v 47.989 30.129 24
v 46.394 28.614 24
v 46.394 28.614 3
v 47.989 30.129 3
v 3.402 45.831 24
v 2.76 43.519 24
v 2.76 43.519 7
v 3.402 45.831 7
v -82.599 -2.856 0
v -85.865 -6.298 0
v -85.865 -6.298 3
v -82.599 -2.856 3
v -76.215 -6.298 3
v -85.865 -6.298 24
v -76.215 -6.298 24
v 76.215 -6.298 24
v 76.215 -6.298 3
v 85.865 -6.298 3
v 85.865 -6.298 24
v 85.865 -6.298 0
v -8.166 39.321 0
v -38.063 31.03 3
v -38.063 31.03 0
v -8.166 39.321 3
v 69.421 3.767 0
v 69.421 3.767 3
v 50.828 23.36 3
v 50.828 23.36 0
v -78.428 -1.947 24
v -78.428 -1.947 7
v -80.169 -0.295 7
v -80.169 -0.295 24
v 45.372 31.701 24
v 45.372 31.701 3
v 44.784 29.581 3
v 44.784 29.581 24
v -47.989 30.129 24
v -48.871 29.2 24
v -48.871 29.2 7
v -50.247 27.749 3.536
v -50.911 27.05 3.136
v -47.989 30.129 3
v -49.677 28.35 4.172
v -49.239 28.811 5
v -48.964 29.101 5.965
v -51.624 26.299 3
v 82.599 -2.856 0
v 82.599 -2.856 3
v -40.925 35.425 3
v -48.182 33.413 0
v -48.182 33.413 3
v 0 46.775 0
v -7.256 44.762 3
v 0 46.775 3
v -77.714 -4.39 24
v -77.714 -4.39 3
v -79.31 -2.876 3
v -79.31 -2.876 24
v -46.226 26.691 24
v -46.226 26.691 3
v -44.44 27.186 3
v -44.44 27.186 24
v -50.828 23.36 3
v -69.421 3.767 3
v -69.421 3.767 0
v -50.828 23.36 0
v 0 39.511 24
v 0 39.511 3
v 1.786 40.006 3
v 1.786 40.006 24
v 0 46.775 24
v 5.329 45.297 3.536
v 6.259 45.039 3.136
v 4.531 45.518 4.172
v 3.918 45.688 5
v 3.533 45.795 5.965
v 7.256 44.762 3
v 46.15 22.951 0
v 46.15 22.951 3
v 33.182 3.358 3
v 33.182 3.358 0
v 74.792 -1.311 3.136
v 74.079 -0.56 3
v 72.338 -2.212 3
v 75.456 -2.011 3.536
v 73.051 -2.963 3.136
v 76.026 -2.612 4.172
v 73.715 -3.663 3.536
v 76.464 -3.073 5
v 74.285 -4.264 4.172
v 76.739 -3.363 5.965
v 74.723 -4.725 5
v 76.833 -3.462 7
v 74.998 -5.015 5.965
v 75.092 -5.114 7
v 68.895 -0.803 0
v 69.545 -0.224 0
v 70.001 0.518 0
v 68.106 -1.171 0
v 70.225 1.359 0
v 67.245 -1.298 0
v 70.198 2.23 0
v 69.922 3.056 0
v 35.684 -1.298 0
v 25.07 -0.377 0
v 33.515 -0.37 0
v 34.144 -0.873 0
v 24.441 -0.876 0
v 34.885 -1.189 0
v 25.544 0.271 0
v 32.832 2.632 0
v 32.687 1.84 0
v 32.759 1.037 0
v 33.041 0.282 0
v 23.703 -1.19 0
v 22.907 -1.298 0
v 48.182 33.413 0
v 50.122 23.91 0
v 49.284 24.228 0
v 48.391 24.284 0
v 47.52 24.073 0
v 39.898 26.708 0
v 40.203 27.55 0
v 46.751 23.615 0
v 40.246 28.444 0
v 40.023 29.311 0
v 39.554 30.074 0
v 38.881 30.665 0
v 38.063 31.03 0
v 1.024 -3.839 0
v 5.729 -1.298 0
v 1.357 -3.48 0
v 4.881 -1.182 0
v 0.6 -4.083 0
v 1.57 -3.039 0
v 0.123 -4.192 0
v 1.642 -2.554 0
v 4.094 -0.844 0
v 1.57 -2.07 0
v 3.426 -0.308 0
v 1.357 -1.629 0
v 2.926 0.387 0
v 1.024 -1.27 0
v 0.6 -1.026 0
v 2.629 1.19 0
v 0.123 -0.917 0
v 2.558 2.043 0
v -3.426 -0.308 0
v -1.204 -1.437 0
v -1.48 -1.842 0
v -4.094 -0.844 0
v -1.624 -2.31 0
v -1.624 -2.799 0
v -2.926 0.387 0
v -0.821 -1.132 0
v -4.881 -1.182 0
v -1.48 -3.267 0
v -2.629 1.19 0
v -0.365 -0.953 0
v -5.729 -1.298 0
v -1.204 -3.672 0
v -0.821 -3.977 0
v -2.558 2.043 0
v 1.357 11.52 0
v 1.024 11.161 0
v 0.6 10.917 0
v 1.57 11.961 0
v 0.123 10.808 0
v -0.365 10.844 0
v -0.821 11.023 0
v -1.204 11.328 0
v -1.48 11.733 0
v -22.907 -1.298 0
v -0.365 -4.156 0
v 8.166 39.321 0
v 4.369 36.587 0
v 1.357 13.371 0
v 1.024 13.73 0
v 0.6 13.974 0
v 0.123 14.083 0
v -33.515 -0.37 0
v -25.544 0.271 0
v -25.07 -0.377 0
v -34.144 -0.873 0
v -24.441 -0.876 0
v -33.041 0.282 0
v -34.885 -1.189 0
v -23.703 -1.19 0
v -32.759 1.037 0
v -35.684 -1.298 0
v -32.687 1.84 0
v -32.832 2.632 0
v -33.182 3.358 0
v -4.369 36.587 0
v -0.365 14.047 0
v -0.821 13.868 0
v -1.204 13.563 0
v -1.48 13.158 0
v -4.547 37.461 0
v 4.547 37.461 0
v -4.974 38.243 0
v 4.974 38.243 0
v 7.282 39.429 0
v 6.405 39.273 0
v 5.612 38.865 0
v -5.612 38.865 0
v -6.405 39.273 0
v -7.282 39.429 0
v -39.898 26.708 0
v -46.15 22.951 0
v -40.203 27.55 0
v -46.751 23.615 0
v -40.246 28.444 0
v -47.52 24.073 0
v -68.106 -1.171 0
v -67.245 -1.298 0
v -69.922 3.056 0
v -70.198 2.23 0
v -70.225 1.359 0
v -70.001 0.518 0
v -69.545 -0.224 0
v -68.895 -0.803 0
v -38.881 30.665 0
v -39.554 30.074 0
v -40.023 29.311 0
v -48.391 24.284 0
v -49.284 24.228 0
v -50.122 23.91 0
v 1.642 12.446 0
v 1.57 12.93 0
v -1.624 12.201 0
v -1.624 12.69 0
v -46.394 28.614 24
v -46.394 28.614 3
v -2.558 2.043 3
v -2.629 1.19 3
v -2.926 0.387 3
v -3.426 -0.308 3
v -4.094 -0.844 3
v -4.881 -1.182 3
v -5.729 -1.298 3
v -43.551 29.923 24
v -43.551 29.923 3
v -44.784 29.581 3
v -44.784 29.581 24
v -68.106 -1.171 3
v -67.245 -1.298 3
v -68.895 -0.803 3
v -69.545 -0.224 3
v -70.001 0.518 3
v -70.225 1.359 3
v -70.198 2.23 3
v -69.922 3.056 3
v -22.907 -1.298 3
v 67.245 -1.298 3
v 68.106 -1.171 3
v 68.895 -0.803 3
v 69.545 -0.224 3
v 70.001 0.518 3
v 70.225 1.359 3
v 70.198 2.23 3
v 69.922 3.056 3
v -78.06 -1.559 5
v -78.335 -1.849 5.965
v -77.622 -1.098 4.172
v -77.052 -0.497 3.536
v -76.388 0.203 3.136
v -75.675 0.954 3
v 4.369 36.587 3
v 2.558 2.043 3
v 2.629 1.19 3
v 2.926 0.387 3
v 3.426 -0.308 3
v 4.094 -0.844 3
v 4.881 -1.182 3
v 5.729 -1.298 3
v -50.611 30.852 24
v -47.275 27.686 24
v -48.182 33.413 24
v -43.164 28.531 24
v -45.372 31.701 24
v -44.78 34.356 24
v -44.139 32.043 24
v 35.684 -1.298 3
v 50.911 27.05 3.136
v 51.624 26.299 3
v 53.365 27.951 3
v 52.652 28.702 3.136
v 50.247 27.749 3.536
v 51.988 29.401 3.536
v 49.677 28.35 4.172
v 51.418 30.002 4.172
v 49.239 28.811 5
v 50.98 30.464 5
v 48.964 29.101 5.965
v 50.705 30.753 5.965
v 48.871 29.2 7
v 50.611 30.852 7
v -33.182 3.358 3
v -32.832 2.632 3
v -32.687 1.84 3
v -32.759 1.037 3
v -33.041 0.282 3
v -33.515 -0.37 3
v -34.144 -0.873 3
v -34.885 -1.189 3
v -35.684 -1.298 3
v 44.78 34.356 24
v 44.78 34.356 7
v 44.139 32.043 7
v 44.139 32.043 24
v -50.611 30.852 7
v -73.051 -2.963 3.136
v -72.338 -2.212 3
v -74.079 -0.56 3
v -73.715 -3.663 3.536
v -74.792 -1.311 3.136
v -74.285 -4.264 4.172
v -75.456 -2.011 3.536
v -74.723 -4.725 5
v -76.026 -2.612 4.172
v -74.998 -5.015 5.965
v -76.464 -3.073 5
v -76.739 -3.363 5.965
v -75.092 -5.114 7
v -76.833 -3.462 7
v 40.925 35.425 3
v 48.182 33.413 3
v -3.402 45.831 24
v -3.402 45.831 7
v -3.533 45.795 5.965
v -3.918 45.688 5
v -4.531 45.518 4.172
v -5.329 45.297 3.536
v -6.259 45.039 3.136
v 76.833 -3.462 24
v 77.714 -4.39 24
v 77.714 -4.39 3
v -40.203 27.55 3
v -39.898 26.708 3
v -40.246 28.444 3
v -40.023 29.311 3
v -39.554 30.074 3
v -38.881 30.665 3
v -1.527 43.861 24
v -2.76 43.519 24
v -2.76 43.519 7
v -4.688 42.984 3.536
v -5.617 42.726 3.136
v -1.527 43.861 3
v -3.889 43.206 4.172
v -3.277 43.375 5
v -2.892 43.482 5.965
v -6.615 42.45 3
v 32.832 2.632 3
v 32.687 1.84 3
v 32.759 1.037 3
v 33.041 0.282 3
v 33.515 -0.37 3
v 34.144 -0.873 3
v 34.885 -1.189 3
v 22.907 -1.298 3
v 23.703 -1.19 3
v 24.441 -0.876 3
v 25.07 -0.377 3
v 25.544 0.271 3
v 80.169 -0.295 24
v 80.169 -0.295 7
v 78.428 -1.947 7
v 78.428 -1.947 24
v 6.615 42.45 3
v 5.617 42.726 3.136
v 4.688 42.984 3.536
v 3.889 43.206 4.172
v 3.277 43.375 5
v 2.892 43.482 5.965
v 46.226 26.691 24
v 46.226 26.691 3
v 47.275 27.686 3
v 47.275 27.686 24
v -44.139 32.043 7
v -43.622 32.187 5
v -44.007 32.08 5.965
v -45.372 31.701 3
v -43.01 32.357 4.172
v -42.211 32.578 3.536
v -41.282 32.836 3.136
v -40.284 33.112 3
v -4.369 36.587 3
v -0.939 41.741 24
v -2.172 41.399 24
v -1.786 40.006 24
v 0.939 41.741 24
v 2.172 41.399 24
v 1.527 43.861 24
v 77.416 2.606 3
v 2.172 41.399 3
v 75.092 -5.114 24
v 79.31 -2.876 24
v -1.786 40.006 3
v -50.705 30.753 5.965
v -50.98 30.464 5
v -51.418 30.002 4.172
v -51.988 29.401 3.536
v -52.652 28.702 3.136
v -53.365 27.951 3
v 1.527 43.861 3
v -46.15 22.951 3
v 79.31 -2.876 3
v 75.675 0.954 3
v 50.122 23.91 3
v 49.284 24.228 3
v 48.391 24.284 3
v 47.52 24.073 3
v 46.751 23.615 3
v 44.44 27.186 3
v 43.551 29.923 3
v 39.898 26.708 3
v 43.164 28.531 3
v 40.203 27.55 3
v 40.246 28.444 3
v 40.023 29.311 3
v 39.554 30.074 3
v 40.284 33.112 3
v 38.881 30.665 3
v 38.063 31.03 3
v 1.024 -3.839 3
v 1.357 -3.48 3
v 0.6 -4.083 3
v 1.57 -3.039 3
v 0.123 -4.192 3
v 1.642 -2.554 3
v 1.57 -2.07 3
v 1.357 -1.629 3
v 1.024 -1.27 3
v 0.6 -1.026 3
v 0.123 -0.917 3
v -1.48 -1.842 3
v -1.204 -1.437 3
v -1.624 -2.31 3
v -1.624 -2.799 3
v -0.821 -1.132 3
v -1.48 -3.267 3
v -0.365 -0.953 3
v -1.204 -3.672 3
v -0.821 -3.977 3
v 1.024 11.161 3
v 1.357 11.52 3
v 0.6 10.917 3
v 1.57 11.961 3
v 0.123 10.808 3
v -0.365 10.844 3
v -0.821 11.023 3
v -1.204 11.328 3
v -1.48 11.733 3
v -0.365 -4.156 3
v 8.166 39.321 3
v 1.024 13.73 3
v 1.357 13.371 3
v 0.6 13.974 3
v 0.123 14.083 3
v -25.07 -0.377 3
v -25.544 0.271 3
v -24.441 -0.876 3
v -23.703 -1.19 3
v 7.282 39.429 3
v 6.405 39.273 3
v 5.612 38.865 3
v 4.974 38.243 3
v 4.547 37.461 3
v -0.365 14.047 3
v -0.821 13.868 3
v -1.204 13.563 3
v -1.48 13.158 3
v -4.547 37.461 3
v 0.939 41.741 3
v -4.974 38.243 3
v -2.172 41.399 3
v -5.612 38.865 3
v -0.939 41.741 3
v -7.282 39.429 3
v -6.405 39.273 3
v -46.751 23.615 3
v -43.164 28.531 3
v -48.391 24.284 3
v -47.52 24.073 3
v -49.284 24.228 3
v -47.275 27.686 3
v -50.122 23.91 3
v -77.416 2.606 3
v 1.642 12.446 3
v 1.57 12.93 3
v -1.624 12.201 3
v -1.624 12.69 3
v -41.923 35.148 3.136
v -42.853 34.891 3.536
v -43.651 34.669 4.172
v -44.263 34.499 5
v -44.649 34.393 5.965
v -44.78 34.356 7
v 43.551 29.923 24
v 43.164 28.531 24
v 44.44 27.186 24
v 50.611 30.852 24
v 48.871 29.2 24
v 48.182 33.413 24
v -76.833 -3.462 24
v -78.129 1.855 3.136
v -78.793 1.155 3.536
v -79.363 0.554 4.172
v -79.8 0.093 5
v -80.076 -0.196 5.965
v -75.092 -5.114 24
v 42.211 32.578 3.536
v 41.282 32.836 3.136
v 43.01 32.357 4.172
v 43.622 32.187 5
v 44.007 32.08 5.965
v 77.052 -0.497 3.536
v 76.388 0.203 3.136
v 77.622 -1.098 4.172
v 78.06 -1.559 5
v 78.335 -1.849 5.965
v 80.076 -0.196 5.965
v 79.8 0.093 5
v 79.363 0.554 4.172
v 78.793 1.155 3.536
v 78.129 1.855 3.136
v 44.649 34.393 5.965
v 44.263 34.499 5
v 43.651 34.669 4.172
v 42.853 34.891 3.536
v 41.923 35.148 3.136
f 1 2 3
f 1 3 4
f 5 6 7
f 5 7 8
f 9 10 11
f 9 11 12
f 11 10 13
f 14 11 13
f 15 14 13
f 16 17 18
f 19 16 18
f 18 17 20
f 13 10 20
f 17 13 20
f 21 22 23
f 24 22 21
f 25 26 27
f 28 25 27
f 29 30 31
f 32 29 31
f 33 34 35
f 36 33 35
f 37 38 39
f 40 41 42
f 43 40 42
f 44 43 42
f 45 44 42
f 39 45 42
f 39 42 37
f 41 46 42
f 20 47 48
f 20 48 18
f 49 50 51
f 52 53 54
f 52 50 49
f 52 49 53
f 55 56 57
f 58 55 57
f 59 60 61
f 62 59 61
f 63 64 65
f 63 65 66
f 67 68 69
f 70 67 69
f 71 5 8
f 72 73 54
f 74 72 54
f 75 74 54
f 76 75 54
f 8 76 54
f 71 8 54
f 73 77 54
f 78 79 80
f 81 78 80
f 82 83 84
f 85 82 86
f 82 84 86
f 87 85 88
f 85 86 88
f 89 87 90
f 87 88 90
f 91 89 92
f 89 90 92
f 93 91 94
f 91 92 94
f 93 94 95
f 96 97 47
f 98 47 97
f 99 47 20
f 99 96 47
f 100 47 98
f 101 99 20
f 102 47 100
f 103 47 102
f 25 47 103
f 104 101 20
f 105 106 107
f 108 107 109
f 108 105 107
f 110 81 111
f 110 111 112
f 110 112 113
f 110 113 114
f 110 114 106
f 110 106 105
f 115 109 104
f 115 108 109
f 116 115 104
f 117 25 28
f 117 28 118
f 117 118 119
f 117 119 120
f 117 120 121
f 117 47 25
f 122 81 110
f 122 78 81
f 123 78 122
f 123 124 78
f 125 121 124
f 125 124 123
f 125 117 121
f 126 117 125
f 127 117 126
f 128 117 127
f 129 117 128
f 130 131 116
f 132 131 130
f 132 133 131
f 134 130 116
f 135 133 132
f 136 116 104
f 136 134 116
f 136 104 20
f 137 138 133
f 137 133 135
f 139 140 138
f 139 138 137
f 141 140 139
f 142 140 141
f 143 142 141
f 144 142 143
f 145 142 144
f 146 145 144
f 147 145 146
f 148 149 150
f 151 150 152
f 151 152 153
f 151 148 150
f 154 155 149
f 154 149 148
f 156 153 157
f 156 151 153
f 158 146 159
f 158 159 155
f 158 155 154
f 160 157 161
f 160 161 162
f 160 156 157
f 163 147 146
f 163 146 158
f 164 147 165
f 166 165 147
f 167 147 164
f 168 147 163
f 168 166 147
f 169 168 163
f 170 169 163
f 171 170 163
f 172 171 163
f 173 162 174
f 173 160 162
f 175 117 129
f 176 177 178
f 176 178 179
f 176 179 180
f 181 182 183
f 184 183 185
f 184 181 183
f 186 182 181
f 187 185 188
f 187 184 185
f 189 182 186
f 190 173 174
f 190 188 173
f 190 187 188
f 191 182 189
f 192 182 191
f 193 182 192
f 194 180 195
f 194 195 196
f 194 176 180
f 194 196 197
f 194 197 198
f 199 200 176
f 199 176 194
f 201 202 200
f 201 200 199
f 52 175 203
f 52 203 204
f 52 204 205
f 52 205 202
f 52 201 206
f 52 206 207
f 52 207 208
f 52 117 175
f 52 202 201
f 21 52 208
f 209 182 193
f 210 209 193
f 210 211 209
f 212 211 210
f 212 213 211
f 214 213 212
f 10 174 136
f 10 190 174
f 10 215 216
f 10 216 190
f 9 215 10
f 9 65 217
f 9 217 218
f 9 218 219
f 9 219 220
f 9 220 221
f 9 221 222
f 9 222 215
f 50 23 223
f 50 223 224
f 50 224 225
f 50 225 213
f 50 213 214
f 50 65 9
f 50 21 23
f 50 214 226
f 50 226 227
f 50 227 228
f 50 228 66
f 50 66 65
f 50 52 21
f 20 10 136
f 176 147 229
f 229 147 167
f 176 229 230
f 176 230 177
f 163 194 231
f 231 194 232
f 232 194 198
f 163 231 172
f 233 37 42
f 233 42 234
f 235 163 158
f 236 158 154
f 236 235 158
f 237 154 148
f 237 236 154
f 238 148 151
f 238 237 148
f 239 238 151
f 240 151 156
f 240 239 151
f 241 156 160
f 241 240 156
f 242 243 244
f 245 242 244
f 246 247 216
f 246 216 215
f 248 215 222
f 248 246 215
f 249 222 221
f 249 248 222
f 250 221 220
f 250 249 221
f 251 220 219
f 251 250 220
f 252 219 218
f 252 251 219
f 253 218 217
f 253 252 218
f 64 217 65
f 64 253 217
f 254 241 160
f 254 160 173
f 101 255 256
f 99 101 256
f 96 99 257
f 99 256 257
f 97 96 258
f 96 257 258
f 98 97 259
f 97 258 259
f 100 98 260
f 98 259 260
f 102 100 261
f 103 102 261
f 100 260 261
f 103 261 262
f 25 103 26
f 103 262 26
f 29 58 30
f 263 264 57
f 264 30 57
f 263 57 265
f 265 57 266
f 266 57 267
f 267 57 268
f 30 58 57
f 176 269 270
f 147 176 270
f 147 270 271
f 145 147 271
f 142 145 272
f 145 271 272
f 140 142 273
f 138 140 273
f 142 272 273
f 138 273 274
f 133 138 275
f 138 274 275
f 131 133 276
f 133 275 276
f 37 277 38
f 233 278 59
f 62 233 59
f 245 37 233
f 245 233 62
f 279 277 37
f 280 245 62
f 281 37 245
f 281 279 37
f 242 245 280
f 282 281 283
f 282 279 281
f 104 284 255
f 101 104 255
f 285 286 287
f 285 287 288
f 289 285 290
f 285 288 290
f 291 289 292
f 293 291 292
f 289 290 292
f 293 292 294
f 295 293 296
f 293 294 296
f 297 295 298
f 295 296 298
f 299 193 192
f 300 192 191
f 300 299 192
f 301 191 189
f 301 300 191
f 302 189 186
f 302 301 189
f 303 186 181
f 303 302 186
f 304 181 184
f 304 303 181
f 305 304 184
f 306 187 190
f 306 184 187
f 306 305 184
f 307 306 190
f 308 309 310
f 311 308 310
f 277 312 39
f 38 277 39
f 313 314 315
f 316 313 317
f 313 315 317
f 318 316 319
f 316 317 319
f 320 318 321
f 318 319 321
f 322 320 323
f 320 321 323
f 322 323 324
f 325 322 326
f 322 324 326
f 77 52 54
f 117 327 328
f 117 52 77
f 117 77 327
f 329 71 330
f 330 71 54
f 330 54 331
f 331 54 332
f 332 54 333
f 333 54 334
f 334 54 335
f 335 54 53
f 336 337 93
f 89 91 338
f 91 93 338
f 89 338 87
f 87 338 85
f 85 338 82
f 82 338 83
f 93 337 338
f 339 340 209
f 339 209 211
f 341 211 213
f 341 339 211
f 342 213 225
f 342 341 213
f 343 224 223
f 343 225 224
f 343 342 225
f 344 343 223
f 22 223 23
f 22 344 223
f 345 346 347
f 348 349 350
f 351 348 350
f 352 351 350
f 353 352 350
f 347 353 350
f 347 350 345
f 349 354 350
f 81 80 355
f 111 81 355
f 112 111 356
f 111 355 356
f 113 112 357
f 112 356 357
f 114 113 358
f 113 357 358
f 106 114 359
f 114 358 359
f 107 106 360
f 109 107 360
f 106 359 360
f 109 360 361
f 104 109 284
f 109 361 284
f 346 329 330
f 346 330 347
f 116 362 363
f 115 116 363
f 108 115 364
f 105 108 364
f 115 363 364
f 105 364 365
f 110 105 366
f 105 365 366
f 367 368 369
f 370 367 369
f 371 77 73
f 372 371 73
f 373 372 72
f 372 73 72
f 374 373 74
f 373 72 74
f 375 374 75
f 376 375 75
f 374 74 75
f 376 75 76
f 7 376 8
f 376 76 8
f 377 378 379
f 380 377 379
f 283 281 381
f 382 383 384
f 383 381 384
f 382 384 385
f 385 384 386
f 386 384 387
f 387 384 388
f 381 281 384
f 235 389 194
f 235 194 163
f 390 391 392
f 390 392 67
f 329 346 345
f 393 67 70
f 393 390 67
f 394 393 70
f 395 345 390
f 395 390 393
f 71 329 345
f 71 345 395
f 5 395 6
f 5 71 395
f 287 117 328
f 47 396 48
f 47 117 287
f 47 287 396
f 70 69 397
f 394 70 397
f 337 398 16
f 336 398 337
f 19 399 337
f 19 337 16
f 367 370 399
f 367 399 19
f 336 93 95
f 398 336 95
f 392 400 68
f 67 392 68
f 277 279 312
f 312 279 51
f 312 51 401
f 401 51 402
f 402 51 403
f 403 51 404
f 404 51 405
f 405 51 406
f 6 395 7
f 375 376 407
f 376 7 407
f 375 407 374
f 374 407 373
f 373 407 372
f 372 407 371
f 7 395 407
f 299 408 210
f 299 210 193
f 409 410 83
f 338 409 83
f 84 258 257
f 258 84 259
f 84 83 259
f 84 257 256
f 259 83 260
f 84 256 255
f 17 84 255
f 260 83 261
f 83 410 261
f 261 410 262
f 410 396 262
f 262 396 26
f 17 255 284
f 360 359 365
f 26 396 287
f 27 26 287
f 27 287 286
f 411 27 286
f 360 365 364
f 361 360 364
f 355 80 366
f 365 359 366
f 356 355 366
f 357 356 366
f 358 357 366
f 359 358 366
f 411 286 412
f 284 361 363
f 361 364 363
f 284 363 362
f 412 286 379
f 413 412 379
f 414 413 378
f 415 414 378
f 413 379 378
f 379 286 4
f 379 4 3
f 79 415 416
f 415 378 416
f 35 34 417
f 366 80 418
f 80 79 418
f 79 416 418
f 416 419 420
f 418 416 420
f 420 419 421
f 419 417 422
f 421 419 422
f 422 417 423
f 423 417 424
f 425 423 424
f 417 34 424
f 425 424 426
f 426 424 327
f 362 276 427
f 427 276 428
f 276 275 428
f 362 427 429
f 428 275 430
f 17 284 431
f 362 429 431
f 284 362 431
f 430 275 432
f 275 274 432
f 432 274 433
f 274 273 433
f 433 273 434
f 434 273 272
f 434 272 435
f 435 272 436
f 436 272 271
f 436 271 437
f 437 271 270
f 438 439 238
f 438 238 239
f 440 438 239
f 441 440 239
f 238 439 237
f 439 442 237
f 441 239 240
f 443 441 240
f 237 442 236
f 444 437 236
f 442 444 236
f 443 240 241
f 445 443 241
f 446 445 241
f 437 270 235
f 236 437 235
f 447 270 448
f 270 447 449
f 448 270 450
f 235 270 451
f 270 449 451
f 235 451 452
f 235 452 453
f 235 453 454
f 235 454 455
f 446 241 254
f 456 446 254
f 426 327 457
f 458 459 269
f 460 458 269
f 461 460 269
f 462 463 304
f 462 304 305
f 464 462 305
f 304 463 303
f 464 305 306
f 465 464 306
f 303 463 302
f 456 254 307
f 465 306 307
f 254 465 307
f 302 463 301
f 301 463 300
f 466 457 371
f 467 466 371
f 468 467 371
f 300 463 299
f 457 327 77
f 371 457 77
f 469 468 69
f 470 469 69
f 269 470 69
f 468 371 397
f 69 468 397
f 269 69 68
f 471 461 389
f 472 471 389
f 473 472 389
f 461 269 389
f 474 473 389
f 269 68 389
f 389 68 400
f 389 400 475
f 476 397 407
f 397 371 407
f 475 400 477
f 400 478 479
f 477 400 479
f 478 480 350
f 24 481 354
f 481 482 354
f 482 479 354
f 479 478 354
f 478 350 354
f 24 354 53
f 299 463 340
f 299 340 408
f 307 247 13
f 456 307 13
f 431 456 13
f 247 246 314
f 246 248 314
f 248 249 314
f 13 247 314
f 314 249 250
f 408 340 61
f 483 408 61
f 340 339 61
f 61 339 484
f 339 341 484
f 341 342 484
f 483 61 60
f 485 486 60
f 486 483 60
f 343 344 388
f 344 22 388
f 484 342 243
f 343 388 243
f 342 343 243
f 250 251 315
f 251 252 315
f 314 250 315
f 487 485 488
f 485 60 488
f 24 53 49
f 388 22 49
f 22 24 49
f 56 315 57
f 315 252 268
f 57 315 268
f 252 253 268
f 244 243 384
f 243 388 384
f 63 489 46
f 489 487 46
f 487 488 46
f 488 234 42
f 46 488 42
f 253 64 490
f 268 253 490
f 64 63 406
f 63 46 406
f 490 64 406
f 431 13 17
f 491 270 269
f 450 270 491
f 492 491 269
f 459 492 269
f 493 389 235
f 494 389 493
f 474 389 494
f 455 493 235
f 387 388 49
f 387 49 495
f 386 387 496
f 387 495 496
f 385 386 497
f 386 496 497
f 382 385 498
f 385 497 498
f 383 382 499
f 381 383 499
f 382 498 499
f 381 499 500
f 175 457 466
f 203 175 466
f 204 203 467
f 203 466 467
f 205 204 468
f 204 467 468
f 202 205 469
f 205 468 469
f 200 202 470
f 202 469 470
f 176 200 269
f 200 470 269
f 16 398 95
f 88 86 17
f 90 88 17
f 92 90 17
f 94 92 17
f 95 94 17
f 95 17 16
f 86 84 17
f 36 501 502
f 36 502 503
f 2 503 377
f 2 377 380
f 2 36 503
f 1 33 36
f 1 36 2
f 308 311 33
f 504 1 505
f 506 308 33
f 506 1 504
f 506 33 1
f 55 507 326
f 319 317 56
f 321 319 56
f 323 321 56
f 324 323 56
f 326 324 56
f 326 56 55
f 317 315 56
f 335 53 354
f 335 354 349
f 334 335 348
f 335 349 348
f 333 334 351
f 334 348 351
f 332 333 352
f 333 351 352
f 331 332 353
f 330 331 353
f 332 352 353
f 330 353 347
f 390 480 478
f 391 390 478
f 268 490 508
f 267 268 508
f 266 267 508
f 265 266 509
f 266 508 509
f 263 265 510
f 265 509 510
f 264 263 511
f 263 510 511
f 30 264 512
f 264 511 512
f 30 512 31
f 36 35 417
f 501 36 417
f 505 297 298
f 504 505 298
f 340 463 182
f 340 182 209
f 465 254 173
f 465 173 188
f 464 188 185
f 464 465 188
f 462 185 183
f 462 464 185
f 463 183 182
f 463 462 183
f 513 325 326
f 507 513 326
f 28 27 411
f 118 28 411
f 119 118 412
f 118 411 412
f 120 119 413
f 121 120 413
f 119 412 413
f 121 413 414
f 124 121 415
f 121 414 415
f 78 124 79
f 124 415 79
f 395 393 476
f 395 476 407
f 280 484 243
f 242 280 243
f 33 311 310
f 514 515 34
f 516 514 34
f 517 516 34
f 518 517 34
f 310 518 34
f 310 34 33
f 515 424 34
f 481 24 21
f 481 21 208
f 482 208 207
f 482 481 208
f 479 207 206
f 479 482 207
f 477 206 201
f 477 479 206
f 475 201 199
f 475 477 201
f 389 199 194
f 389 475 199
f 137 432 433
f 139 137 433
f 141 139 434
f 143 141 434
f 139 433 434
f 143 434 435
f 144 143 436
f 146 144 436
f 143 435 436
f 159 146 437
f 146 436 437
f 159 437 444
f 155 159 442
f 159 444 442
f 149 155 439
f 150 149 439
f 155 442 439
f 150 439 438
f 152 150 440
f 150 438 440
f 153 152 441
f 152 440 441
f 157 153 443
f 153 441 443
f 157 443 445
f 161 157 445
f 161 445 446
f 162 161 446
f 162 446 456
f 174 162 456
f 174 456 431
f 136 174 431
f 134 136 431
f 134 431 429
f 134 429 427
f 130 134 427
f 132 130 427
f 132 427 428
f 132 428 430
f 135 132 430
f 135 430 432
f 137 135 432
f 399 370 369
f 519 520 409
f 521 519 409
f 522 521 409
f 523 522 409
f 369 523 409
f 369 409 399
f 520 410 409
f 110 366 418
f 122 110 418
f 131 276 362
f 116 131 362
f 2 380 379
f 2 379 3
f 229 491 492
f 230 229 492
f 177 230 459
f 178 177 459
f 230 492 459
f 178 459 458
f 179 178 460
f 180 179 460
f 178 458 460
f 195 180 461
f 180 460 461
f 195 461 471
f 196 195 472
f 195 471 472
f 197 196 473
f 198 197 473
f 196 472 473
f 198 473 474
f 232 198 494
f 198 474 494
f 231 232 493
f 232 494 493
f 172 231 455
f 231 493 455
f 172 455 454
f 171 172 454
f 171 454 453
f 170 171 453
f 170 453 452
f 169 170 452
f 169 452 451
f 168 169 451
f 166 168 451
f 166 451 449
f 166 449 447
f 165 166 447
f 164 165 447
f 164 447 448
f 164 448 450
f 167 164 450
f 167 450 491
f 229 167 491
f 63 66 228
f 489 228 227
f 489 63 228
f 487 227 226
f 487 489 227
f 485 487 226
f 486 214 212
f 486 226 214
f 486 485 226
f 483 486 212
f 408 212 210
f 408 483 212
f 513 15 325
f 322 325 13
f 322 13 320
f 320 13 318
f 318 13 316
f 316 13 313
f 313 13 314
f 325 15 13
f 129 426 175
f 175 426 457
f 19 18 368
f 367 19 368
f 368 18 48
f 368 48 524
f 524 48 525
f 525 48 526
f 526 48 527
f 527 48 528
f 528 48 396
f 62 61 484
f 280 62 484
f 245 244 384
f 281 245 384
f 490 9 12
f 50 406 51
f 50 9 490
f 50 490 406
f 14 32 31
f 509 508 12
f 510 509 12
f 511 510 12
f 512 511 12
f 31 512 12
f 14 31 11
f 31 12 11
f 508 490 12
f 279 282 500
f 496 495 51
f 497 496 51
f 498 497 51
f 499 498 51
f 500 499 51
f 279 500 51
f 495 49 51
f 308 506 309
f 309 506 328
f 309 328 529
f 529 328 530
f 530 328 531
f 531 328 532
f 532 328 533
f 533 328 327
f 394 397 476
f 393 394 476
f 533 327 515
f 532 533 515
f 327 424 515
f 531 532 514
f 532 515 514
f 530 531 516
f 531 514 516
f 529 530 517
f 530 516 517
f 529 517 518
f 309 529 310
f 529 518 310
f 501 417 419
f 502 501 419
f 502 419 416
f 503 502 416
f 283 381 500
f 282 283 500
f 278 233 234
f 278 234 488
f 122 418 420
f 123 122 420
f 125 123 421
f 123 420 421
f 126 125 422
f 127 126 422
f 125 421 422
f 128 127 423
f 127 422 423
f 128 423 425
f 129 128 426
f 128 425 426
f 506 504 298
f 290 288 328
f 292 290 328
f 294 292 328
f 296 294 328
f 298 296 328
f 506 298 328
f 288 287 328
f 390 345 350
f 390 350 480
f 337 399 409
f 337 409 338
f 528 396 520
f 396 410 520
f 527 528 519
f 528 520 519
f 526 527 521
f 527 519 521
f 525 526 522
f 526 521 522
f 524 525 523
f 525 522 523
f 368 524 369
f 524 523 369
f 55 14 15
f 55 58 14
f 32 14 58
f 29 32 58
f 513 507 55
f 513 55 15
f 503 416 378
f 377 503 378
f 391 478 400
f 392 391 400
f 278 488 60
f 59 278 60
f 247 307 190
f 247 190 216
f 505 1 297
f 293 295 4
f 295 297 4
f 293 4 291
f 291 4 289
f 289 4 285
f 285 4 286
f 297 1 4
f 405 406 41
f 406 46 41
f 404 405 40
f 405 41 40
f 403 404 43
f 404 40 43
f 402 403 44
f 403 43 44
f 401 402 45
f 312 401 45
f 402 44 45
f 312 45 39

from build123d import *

# Parameters (mm, degrees)
BOSS_EXTRUDE1_DEPTH = 3
BOSS_EXTRUDE2_DEPTH = 21
SKETCH3_R           = 1.642484664
CUT_EXTRUDE1_DEPTH  = 101.008681907
FILLET3_R           = 4
FILLET4_R           = 4


with BuildPart() as part:
    # Sketch1 → Boss-Extrude1 (new body)
    with BuildSketch(Plane.XY):
        Polygon((0, 46.774719198), (48.18152266, 33.412800394), (82.599251445, -2.855918156), (85.865371953, -6.297691035), (78.97237959, -6.297691035), (-78.97237959, -6.297691035), (-85.865371953, -6.297691035), (-82.599251445, -2.855918156), (-48.18152266, 33.412800394), align=None)
    extrude(amount=BOSS_EXTRUDE1_DEPTH)

    # Sketch2 → Boss-Extrude2 (add)
    with BuildSketch(Plane.XY.offset(3)):
        Polygon((-44.779907161, 34.356151862), (-48.18152266, 33.412800394), (-50.611414313, 30.852228864), (-48.870515822, 29.200177883), (-47.989421965, 30.128657078), (-46.393598349, 28.614277011), (-47.274692206, 27.685797816), (-46.22623914, 26.690853007), (-44.440185395, 27.186169547), (-43.164345406, 28.530624372), (-43.550610631, 29.923451777), (-44.784057611, 29.581386656), (-45.371982038, 31.701373653), (-44.138535058, 32.043438774), align=None)
        Polygon((0, 46.774719198), (-3.4016155, 45.83136773), (-2.760243397, 43.518654643), (-1.526796417, 43.860719764), (-0.93887199, 41.740732767), (-2.17231897, 41.398667646), (-1.786053745, 40.00584024), (0, 39.5105237), (1.786053745, 40.00584024), (2.17231897, 41.398667646), (0.93887199, 41.740732767), (1.526796417, 43.860719764), (2.760243397, 43.518654643), (3.4016155, 45.83136773), align=None)
        Polygon((-78.428461302, -1.947397608), (-80.169359793, -0.295346627), (-85.865371953, -6.297691035), (-76.215182645, -6.297691035), (-75.091739196, -5.113828657), (-76.832637686, -3.461777675), (-77.713731543, -4.39025687), (-79.309555159, -2.875876803), align=None)
        Polygon((48.18152266, 33.412800394), (44.779907161, 34.356151862), (44.138535058, 32.043438774), (45.371982038, 31.701373653), (44.784057611, 29.581386656), (43.550610631, 29.923451777), (43.164345406, 28.530624372), (44.440185395, 27.186169547), (46.22623914, 26.690853007), (47.274692206, 27.685797816), (46.393598349, 28.614277011), (47.989421965, 30.128657078), (48.870515822, 29.200177883), (50.611414313, 30.852228864), align=None)
        Polygon((75.091739196, -5.113828657), (76.215182645, -6.297691035), (85.865371953, -6.297691035), (80.169359793, -0.295346627), (78.428461302, -1.947397608), (79.309555159, -2.875876803), (77.713731543, -4.39025687), (76.832637686, -3.461777675), align=None)
    extrude(amount=BOSS_EXTRUDE2_DEPTH)

    # Sketch3 → Cut-Extrude1 (cut, through all)
    with BuildSketch(Plane.XY.offset(3)):
        with Locations((0, -2.554468846)):
            Circle(SKETCH3_R)
        with Locations((0, 12.445531154)):
            Circle(SKETCH3_R)
        with BuildLine():
            Line((-69.420990751, 3.767372692), (-50.828151114, 23.360137575))
            ThreePointArc((-50.828151114, 23.360137575), (-48.390560772, 24.283657942), (-46.150370534, 22.950884804))
            Line((-46.150370534, 22.950884804), (-33.182202355, 3.358119921))
            ThreePointArc((-33.182202355, 3.358119921), (-33.041187606, 0.282349963), (-35.683859821, -1.297691035))
            Line((-35.683859821, -1.297691035), (-67.244867638, -1.297691035))
            ThreePointArc((-67.244867638, -1.297691035), (-70.001241269, 0.518077396), (-69.420990751, 3.767372692))
        make_face()
        with BuildLine():
            Line((-25.543650537, 0.270832684), (-39.897767636, 26.707827652))
            ThreePointArc((-39.897767636, 26.707827652), (-40.022830858, 29.311497318), (-38.063031426, 31.030195292))
            Line((-38.063031426, 31.030195292), (-8.166425929, 39.321257781))
            ThreePointArc((-8.166425929, 39.321257781), (-5.611961803, 38.865088367), (-4.368822196, 36.58737429))
            Line((-4.368822196, 36.58737429), (-2.558453179, 2.043475626))
            ThreePointArc((-2.558453179, 2.043475626), (-3.426038324, -0.308216813), (-5.729101952, -1.297691035))
            Line((-5.729101952, -1.297691035), (-22.907199199, -1.297691035))
            ThreePointArc((-22.907199199, -1.297691035), (-24.441078457, -0.875910269), (-25.543650537, 0.270832684))
        make_face()
        with BuildLine():
            Line((5.729101952, -1.297691035), (22.907199199, -1.297691035))
            ThreePointArc((22.907199199, -1.297691035), (24.441078457, -0.875910269), (25.543650537, 0.270832684))
            Line((25.543650537, 0.270832684), (39.897767636, 26.707827652))
            ThreePointArc((39.897767636, 26.707827652), (40.022830858, 29.311497318), (38.063031426, 31.030195292))
            Line((38.063031426, 31.030195292), (8.166425929, 39.321257781))
            ThreePointArc((8.166425929, 39.321257781), (5.611961803, 38.865088367), (4.368822196, 36.58737429))
            Line((4.368822196, 36.58737429), (2.558453179, 2.043475626))
            ThreePointArc((2.558453179, 2.043475626), (3.426038324, -0.308216813), (5.729101952, -1.297691035))
        make_face()
        with BuildLine():
            Line((35.683859821, -1.297691035), (67.244867638, -1.297691035))
            ThreePointArc((67.244867638, -1.297691035), (70.001241269, 0.518077396), (69.420990751, 3.767372692))
            Line((69.420990751, 3.767372692), (50.828151114, 23.360137575))
            ThreePointArc((50.828151114, 23.360137575), (48.390560772, 24.283657942), (46.150370534, 22.950884804))
            Line((46.150370534, 22.950884804), (33.182202355, 3.358119921))
            ThreePointArc((33.182202355, 3.358119921), (33.041187606, 0.282349963), (35.683859821, -1.297691035))
        make_face()
    extrude(amount=-CUT_EXTRUDE1_DEPTH, mode=Mode.SUBTRACT)

    # Fillet3
    fillet3_edges = [part.edges().sort_by_distance(p)[0] for p in [
        (-79.298910548, -1.121372118, 3),
    ]]
    fillet(fillet3_edges, radius=FILLET3_R)

    # Fillet4
    fillet4_edges = [part.edges().sort_by_distance(p)[0] for p in [
        (79.298910548, -1.121372118, 3),
        (49.740965067, 30.026203374, 3),
        (44.459221109, 33.199795318, 3),
        (3.080929449, 44.675011187, 3),
        (-3.080929449, 44.675011187, 3),
        (-44.459221109, 33.199795318, 3),
        (-75.962188441, -4.287803166, 3),
        (-49.740965067, 30.026203374, 3),
        (75.962188441, -4.287803166, 3),
    ]]
    fillet(fillet4_edges, radius=FILLET4_R)


solid = part.part
